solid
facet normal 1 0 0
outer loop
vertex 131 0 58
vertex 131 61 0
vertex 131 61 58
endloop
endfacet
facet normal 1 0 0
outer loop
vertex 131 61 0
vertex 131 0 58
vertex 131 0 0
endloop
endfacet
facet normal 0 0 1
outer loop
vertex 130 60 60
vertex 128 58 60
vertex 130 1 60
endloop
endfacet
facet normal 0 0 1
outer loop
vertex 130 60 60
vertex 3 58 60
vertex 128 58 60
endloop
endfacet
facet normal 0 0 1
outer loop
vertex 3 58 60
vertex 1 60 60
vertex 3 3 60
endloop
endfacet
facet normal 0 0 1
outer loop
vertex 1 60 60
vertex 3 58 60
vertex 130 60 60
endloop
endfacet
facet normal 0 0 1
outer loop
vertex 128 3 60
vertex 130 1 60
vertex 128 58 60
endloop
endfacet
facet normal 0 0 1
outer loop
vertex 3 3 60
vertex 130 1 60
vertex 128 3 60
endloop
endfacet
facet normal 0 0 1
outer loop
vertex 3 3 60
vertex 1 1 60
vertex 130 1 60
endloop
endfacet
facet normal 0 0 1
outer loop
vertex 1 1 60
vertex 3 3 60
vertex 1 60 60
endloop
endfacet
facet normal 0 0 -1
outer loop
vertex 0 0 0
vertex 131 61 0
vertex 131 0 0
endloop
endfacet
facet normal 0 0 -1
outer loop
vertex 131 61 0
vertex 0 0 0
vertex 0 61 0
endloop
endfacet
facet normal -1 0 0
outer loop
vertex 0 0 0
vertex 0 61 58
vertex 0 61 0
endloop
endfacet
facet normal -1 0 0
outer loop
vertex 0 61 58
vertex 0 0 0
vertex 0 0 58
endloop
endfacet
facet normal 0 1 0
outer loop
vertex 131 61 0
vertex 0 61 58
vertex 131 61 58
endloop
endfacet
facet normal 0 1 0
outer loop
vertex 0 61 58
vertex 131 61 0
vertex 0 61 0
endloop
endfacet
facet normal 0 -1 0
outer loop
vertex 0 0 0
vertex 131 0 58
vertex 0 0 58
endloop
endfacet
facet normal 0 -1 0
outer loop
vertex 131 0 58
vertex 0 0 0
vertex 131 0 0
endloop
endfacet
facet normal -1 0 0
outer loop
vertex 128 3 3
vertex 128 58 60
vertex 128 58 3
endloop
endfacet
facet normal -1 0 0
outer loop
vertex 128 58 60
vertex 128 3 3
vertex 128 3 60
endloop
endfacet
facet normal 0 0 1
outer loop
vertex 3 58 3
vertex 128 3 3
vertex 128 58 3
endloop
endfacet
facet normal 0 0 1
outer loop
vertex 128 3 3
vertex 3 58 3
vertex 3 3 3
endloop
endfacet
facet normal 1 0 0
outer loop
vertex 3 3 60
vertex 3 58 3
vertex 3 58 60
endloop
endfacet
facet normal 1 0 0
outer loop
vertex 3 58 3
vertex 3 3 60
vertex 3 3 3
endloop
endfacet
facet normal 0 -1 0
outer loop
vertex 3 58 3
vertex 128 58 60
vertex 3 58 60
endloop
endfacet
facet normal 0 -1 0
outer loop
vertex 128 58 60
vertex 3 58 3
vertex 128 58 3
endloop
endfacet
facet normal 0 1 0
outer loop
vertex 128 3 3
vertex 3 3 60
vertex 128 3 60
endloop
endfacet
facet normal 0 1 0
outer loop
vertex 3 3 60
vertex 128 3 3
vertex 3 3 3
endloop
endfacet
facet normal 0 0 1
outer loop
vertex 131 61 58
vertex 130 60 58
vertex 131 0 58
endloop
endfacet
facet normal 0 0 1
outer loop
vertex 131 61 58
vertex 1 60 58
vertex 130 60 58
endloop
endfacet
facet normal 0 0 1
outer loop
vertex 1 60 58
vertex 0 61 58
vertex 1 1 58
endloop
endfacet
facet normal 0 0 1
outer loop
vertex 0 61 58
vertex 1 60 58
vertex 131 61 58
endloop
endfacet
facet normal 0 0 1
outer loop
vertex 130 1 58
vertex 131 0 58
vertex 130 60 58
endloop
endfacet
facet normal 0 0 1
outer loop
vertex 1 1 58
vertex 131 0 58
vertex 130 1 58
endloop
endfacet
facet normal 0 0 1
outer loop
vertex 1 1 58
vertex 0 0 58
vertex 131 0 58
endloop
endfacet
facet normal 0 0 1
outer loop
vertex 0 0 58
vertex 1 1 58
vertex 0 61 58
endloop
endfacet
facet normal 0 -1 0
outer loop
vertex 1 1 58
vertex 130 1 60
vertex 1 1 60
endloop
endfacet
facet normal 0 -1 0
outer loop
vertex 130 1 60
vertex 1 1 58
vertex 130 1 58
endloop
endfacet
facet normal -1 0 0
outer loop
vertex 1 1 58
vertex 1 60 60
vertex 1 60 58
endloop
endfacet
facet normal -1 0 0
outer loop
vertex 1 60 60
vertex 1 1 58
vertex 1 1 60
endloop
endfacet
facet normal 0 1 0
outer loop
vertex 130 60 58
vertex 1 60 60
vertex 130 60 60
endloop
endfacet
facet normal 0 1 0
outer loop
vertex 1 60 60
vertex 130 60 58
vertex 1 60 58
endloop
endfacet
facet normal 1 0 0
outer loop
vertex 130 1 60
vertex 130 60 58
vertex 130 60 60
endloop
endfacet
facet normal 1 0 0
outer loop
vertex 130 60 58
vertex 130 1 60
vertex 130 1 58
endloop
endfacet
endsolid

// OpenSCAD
Wall=3;
DW=Wall*2;
LengthX=125+DW;
WidthY=55+DW;
HightZ=60;
Brim=1;
DB=Brim*2;


difference()
{
  cube([LengthX,WidthY,HightZ]); //Base box
  translate([Wall,Wall,Wall]) cube([LengthX-DW,WidthY-DW,HightZ]); //Base cutour
  translate([-1,-1,HightZ-DB]) cube([LengthX+DW,DB,DB+1]);
  translate([-1,-1,HightZ-DB]) cube([2,WidthY+DW,DB+1]);
  translate([-1,WidthY-Brim,HightZ-DB]) cube([LengthX+DW,DB,DB+1]);
  translate([LengthX-Brim,-1,HightZ-DB]) cube([DB,WidthY+DW,DB+1]);
}
